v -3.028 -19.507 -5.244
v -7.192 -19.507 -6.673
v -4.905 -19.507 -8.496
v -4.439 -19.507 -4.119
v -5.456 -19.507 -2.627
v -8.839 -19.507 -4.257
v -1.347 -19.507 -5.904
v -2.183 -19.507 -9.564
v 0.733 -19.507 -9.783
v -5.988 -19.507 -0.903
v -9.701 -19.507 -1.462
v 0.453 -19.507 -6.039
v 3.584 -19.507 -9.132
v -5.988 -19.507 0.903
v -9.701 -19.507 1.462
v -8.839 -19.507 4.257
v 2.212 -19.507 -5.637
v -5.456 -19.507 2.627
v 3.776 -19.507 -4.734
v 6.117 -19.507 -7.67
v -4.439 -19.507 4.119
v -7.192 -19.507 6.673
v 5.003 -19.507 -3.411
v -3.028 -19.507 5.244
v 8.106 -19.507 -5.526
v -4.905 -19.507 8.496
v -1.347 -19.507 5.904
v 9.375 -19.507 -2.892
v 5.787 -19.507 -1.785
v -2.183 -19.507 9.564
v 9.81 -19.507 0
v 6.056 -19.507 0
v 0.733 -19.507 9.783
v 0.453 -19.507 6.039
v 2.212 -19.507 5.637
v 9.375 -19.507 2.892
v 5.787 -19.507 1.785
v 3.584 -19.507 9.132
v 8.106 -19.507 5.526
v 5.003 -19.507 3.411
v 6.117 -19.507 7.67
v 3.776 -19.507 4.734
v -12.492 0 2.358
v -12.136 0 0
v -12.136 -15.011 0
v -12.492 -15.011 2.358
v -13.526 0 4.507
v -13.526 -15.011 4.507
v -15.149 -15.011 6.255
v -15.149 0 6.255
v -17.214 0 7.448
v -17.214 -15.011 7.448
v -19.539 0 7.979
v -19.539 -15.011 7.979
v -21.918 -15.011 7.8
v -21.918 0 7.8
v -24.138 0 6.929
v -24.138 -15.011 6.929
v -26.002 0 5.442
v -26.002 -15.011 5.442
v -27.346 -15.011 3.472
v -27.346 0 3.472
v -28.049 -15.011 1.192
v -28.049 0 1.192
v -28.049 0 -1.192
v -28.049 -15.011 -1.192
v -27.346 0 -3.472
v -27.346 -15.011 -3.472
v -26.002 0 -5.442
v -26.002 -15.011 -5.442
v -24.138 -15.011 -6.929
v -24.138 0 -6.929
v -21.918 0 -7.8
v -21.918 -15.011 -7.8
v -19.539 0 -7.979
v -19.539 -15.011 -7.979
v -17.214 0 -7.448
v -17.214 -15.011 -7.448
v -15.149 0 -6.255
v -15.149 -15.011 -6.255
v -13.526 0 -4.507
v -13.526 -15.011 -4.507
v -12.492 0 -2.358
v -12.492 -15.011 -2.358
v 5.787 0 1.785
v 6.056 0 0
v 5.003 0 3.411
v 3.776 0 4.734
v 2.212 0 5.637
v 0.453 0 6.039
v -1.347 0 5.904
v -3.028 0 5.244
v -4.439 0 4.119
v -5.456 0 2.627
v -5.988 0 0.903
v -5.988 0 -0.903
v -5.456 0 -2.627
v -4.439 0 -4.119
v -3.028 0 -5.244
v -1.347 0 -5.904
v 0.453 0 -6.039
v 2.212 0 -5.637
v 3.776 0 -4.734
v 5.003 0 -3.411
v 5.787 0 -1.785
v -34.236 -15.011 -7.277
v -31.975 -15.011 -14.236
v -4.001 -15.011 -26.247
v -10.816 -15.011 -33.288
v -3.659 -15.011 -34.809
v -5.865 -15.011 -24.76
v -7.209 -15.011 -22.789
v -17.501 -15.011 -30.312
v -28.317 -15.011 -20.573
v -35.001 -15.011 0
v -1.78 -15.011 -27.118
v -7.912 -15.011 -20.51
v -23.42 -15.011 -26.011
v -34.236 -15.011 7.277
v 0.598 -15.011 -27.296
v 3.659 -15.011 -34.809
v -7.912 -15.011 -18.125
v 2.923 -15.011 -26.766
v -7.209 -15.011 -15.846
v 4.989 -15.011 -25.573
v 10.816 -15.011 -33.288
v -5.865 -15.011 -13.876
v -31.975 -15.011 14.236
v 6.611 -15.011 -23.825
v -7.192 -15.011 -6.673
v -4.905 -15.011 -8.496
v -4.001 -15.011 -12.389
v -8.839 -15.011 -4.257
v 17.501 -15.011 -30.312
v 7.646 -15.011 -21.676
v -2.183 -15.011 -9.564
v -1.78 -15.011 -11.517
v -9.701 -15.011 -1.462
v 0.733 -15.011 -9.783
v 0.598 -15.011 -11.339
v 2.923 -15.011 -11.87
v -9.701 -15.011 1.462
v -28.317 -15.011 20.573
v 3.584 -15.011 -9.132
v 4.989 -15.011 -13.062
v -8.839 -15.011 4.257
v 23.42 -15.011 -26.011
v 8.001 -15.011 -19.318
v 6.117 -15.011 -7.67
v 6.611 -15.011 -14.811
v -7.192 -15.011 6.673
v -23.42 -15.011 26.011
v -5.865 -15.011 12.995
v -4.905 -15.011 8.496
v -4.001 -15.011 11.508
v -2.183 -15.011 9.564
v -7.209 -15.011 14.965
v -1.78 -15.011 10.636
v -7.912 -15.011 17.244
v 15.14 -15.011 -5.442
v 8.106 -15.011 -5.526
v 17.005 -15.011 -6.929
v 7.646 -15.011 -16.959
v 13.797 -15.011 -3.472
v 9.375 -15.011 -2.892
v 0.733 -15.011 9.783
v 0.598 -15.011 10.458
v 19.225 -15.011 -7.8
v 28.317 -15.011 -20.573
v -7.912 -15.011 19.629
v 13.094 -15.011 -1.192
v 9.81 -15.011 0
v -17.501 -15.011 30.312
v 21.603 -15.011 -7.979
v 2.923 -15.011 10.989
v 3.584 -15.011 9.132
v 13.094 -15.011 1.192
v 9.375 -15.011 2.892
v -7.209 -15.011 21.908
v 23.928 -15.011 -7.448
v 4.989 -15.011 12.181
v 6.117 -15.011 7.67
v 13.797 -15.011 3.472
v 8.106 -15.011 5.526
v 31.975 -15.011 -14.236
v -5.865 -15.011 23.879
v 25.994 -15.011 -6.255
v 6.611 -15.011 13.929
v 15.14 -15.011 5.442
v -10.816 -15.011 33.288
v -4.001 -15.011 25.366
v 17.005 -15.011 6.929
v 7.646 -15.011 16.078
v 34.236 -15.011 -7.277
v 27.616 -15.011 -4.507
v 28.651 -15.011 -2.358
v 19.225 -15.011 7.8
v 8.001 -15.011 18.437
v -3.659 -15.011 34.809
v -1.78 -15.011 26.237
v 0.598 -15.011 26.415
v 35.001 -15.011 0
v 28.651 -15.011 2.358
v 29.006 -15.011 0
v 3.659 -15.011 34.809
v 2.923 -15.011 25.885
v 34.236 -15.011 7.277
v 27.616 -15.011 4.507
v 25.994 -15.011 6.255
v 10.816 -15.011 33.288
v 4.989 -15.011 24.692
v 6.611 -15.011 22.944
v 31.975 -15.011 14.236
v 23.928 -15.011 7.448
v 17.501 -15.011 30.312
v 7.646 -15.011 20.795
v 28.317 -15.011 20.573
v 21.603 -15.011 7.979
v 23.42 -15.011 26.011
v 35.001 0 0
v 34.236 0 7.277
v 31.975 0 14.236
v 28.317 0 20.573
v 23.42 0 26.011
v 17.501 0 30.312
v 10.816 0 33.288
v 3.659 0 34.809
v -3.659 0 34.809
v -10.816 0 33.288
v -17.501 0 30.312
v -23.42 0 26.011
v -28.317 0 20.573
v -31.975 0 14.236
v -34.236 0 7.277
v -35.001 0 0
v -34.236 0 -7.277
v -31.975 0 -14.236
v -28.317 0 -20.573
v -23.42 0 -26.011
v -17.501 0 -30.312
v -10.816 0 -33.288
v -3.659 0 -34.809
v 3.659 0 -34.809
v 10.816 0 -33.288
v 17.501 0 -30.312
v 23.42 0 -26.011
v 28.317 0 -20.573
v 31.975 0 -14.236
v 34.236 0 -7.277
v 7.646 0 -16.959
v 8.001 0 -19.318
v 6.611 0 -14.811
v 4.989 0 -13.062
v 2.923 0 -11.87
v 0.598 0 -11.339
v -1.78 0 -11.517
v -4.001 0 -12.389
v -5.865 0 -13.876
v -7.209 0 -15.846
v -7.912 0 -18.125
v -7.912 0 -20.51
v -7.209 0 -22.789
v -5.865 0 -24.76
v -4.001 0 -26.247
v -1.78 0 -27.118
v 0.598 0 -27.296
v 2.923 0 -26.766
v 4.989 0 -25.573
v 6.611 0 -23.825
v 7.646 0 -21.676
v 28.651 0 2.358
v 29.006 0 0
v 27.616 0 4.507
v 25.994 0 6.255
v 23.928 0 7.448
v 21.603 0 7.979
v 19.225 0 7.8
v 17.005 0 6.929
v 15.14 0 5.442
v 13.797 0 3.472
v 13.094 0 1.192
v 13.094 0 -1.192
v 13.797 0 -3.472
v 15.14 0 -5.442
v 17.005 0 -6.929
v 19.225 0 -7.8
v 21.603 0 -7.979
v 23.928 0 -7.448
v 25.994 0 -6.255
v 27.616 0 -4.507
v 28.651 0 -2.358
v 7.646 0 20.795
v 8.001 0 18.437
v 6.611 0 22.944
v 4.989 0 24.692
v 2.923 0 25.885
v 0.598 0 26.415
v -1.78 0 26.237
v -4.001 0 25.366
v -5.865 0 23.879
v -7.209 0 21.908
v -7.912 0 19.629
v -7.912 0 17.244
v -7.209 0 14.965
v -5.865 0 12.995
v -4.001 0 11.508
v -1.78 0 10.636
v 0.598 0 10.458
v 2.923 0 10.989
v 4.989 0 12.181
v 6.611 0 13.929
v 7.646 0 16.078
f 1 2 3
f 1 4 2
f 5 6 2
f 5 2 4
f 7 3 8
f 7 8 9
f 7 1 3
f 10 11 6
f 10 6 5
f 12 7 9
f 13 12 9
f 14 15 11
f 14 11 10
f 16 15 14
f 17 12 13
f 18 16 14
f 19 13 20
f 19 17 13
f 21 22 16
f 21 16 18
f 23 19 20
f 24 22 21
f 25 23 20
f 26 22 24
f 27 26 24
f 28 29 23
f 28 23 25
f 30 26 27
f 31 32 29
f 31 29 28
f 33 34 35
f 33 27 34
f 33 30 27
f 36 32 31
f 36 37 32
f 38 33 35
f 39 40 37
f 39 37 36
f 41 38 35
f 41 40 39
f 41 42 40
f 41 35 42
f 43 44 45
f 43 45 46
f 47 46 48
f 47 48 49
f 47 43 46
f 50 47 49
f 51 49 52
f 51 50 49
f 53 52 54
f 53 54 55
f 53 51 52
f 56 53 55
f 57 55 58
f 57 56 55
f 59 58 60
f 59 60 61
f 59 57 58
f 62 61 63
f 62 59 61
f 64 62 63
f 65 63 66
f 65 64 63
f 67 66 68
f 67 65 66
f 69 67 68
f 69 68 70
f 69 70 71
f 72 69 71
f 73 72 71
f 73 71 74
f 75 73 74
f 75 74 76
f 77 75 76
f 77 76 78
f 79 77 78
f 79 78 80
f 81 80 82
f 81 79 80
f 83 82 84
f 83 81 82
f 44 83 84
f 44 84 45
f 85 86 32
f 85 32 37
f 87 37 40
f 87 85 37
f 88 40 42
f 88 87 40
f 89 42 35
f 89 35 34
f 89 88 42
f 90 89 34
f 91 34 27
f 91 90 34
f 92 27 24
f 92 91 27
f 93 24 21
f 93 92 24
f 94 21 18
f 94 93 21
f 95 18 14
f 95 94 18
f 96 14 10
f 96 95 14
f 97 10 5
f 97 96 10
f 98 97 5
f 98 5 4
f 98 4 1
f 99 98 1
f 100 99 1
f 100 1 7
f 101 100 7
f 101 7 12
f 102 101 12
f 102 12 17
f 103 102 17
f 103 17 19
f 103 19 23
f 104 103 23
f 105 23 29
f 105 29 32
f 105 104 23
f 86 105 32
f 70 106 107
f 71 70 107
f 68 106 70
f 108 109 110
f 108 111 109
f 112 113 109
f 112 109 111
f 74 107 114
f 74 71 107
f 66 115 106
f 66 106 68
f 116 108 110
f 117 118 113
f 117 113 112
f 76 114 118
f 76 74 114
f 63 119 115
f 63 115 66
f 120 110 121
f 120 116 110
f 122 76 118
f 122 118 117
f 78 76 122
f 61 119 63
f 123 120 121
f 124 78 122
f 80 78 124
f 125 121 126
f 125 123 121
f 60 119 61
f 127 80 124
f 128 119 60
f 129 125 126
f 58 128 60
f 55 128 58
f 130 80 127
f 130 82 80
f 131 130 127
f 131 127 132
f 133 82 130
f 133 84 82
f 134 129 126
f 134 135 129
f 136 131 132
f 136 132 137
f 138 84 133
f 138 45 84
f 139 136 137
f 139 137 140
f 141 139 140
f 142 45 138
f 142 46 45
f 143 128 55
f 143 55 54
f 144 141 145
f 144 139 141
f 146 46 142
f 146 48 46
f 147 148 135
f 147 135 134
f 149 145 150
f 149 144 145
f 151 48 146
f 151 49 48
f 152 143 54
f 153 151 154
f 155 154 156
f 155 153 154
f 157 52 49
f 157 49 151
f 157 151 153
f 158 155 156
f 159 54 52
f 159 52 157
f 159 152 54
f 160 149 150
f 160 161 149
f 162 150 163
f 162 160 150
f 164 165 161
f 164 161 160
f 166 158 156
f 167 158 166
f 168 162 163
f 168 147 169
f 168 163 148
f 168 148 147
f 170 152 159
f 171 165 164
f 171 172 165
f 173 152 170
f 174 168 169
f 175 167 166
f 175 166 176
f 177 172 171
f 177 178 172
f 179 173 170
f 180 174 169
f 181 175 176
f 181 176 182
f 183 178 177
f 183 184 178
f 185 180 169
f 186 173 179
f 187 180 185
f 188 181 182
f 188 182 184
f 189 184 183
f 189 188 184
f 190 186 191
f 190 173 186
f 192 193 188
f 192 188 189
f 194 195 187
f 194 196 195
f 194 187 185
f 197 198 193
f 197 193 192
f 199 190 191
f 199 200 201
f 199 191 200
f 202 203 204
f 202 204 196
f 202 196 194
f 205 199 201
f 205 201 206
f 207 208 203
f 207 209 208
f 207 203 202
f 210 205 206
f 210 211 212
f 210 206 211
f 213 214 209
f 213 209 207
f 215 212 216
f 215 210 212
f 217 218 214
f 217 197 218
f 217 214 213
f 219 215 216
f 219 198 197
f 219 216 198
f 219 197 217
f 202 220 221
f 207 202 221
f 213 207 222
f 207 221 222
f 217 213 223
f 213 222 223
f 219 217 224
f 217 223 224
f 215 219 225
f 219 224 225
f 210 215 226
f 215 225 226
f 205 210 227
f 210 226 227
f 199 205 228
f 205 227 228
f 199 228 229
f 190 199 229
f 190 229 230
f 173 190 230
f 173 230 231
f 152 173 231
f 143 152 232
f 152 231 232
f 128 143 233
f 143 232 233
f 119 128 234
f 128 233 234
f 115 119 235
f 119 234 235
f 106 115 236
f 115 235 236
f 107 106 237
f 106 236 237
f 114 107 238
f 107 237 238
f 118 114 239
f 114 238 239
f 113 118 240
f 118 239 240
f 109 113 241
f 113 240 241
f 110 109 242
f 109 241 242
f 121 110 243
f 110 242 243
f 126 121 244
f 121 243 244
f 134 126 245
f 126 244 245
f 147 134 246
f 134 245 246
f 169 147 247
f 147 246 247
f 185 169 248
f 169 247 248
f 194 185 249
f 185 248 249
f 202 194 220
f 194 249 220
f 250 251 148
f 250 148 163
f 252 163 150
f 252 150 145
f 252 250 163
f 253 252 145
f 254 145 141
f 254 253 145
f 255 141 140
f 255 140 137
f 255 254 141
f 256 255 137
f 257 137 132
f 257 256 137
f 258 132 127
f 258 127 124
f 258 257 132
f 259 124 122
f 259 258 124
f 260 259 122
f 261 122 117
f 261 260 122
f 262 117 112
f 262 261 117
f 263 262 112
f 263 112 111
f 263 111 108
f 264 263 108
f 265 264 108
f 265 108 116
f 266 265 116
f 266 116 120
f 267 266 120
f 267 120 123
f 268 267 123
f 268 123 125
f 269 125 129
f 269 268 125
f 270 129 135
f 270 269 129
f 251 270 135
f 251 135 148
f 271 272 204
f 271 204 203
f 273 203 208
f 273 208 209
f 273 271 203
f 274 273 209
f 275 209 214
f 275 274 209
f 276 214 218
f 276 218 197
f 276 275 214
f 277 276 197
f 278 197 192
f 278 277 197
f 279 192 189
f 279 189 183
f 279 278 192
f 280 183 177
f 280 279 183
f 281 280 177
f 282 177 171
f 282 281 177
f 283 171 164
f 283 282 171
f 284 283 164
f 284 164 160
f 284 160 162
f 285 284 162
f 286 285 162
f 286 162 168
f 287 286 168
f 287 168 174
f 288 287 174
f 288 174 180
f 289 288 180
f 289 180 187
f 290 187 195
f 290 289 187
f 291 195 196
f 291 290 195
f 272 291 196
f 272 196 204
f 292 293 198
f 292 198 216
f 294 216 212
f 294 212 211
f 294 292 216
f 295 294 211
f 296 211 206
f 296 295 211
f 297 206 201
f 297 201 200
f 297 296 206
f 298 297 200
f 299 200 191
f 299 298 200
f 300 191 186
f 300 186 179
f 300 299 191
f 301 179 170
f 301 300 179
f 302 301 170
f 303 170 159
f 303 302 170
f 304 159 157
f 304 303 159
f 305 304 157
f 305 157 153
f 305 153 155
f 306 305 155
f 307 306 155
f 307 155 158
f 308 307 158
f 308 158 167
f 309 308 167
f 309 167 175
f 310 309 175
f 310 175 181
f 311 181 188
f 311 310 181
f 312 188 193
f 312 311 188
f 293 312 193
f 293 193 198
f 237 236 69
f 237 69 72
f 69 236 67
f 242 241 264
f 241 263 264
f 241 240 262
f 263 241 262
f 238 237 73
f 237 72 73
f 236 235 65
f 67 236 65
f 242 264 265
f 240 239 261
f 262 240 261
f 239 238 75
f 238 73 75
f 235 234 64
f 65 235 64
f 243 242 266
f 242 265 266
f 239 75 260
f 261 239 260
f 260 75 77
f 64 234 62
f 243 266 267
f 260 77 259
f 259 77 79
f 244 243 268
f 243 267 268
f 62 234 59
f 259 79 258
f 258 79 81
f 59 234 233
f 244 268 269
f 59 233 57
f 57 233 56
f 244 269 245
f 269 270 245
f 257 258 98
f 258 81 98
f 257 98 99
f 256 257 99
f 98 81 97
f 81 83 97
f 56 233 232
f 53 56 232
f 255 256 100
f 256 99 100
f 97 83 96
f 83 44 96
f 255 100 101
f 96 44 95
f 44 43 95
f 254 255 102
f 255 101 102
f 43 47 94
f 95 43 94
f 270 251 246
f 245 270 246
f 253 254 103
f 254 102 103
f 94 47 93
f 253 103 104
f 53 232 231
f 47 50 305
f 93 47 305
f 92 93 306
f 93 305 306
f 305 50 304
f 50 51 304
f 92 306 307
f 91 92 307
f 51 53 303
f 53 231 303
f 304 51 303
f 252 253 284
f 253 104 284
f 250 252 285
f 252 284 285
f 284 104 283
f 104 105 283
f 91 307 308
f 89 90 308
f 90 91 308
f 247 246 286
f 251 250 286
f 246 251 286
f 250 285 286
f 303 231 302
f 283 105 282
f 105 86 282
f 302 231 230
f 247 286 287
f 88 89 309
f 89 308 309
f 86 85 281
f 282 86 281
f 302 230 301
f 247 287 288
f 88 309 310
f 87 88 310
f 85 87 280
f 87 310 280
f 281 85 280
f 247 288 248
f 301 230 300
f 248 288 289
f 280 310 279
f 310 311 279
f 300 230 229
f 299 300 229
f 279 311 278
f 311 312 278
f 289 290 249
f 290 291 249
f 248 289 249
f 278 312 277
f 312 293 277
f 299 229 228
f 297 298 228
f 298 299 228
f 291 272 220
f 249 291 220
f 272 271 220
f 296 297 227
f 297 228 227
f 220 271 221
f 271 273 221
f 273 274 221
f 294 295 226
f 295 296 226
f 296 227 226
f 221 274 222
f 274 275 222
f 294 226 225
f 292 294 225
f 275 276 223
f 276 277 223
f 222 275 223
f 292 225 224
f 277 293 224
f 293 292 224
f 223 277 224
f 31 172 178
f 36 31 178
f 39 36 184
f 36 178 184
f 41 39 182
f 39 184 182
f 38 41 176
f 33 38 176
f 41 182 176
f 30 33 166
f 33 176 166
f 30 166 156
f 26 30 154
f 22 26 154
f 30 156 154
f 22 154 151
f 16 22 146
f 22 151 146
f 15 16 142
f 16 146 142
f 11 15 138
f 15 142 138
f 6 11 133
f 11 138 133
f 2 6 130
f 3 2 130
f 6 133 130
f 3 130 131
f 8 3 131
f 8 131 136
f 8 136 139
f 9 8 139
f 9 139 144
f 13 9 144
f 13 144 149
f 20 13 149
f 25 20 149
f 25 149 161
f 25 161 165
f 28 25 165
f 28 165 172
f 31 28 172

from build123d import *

# Parameters (mm, degrees)
F0_R     = 35.0012
F0_R_2   = 29.9974
F1_DEPTH = 15.0114
F0_R_3   = 8.001
F0_R_4   = 9.810431
F2_DEPTH = 15.0114
F0_R_5   = 6.055532
F3_DEPTH = 19.5072


with BuildPart() as f1:
    # F0 (on Front) → F1 (new body)
    with BuildSketch(Plane.XZ):
        Circle(F0_R)
        Circle(F0_R_2, mode=Mode.SUBTRACT)
    extrude(amount=F1_DEPTH)

    # F0 (on Front) → F2 (join)
    with BuildSketch(Plane.XZ):
        Circle(F0_R_2)
        with Locations((0, -19.317703)):
            Circle(F0_R_3, mode=Mode.SUBTRACT)
        with Locations((-20.137208, 0)):
            Circle(F0_R_3, mode=Mode.SUBTRACT)
        Circle(F0_R_4, mode=Mode.SUBTRACT)
        with Locations((21.005314, 0)):
            Circle(F0_R_3, mode=Mode.SUBTRACT)
        with Locations((0, 18.436611)):
            Circle(F0_R_3, mode=Mode.SUBTRACT)
    extrude(amount=F2_DEPTH)

    # F0 (on Front) → F3 (join)
    with BuildSketch(Plane.XZ):
        Circle(F0_R_4)
        Circle(F0_R_5, mode=Mode.SUBTRACT)
    extrude(amount=F3_DEPTH)


solid = f1.part
